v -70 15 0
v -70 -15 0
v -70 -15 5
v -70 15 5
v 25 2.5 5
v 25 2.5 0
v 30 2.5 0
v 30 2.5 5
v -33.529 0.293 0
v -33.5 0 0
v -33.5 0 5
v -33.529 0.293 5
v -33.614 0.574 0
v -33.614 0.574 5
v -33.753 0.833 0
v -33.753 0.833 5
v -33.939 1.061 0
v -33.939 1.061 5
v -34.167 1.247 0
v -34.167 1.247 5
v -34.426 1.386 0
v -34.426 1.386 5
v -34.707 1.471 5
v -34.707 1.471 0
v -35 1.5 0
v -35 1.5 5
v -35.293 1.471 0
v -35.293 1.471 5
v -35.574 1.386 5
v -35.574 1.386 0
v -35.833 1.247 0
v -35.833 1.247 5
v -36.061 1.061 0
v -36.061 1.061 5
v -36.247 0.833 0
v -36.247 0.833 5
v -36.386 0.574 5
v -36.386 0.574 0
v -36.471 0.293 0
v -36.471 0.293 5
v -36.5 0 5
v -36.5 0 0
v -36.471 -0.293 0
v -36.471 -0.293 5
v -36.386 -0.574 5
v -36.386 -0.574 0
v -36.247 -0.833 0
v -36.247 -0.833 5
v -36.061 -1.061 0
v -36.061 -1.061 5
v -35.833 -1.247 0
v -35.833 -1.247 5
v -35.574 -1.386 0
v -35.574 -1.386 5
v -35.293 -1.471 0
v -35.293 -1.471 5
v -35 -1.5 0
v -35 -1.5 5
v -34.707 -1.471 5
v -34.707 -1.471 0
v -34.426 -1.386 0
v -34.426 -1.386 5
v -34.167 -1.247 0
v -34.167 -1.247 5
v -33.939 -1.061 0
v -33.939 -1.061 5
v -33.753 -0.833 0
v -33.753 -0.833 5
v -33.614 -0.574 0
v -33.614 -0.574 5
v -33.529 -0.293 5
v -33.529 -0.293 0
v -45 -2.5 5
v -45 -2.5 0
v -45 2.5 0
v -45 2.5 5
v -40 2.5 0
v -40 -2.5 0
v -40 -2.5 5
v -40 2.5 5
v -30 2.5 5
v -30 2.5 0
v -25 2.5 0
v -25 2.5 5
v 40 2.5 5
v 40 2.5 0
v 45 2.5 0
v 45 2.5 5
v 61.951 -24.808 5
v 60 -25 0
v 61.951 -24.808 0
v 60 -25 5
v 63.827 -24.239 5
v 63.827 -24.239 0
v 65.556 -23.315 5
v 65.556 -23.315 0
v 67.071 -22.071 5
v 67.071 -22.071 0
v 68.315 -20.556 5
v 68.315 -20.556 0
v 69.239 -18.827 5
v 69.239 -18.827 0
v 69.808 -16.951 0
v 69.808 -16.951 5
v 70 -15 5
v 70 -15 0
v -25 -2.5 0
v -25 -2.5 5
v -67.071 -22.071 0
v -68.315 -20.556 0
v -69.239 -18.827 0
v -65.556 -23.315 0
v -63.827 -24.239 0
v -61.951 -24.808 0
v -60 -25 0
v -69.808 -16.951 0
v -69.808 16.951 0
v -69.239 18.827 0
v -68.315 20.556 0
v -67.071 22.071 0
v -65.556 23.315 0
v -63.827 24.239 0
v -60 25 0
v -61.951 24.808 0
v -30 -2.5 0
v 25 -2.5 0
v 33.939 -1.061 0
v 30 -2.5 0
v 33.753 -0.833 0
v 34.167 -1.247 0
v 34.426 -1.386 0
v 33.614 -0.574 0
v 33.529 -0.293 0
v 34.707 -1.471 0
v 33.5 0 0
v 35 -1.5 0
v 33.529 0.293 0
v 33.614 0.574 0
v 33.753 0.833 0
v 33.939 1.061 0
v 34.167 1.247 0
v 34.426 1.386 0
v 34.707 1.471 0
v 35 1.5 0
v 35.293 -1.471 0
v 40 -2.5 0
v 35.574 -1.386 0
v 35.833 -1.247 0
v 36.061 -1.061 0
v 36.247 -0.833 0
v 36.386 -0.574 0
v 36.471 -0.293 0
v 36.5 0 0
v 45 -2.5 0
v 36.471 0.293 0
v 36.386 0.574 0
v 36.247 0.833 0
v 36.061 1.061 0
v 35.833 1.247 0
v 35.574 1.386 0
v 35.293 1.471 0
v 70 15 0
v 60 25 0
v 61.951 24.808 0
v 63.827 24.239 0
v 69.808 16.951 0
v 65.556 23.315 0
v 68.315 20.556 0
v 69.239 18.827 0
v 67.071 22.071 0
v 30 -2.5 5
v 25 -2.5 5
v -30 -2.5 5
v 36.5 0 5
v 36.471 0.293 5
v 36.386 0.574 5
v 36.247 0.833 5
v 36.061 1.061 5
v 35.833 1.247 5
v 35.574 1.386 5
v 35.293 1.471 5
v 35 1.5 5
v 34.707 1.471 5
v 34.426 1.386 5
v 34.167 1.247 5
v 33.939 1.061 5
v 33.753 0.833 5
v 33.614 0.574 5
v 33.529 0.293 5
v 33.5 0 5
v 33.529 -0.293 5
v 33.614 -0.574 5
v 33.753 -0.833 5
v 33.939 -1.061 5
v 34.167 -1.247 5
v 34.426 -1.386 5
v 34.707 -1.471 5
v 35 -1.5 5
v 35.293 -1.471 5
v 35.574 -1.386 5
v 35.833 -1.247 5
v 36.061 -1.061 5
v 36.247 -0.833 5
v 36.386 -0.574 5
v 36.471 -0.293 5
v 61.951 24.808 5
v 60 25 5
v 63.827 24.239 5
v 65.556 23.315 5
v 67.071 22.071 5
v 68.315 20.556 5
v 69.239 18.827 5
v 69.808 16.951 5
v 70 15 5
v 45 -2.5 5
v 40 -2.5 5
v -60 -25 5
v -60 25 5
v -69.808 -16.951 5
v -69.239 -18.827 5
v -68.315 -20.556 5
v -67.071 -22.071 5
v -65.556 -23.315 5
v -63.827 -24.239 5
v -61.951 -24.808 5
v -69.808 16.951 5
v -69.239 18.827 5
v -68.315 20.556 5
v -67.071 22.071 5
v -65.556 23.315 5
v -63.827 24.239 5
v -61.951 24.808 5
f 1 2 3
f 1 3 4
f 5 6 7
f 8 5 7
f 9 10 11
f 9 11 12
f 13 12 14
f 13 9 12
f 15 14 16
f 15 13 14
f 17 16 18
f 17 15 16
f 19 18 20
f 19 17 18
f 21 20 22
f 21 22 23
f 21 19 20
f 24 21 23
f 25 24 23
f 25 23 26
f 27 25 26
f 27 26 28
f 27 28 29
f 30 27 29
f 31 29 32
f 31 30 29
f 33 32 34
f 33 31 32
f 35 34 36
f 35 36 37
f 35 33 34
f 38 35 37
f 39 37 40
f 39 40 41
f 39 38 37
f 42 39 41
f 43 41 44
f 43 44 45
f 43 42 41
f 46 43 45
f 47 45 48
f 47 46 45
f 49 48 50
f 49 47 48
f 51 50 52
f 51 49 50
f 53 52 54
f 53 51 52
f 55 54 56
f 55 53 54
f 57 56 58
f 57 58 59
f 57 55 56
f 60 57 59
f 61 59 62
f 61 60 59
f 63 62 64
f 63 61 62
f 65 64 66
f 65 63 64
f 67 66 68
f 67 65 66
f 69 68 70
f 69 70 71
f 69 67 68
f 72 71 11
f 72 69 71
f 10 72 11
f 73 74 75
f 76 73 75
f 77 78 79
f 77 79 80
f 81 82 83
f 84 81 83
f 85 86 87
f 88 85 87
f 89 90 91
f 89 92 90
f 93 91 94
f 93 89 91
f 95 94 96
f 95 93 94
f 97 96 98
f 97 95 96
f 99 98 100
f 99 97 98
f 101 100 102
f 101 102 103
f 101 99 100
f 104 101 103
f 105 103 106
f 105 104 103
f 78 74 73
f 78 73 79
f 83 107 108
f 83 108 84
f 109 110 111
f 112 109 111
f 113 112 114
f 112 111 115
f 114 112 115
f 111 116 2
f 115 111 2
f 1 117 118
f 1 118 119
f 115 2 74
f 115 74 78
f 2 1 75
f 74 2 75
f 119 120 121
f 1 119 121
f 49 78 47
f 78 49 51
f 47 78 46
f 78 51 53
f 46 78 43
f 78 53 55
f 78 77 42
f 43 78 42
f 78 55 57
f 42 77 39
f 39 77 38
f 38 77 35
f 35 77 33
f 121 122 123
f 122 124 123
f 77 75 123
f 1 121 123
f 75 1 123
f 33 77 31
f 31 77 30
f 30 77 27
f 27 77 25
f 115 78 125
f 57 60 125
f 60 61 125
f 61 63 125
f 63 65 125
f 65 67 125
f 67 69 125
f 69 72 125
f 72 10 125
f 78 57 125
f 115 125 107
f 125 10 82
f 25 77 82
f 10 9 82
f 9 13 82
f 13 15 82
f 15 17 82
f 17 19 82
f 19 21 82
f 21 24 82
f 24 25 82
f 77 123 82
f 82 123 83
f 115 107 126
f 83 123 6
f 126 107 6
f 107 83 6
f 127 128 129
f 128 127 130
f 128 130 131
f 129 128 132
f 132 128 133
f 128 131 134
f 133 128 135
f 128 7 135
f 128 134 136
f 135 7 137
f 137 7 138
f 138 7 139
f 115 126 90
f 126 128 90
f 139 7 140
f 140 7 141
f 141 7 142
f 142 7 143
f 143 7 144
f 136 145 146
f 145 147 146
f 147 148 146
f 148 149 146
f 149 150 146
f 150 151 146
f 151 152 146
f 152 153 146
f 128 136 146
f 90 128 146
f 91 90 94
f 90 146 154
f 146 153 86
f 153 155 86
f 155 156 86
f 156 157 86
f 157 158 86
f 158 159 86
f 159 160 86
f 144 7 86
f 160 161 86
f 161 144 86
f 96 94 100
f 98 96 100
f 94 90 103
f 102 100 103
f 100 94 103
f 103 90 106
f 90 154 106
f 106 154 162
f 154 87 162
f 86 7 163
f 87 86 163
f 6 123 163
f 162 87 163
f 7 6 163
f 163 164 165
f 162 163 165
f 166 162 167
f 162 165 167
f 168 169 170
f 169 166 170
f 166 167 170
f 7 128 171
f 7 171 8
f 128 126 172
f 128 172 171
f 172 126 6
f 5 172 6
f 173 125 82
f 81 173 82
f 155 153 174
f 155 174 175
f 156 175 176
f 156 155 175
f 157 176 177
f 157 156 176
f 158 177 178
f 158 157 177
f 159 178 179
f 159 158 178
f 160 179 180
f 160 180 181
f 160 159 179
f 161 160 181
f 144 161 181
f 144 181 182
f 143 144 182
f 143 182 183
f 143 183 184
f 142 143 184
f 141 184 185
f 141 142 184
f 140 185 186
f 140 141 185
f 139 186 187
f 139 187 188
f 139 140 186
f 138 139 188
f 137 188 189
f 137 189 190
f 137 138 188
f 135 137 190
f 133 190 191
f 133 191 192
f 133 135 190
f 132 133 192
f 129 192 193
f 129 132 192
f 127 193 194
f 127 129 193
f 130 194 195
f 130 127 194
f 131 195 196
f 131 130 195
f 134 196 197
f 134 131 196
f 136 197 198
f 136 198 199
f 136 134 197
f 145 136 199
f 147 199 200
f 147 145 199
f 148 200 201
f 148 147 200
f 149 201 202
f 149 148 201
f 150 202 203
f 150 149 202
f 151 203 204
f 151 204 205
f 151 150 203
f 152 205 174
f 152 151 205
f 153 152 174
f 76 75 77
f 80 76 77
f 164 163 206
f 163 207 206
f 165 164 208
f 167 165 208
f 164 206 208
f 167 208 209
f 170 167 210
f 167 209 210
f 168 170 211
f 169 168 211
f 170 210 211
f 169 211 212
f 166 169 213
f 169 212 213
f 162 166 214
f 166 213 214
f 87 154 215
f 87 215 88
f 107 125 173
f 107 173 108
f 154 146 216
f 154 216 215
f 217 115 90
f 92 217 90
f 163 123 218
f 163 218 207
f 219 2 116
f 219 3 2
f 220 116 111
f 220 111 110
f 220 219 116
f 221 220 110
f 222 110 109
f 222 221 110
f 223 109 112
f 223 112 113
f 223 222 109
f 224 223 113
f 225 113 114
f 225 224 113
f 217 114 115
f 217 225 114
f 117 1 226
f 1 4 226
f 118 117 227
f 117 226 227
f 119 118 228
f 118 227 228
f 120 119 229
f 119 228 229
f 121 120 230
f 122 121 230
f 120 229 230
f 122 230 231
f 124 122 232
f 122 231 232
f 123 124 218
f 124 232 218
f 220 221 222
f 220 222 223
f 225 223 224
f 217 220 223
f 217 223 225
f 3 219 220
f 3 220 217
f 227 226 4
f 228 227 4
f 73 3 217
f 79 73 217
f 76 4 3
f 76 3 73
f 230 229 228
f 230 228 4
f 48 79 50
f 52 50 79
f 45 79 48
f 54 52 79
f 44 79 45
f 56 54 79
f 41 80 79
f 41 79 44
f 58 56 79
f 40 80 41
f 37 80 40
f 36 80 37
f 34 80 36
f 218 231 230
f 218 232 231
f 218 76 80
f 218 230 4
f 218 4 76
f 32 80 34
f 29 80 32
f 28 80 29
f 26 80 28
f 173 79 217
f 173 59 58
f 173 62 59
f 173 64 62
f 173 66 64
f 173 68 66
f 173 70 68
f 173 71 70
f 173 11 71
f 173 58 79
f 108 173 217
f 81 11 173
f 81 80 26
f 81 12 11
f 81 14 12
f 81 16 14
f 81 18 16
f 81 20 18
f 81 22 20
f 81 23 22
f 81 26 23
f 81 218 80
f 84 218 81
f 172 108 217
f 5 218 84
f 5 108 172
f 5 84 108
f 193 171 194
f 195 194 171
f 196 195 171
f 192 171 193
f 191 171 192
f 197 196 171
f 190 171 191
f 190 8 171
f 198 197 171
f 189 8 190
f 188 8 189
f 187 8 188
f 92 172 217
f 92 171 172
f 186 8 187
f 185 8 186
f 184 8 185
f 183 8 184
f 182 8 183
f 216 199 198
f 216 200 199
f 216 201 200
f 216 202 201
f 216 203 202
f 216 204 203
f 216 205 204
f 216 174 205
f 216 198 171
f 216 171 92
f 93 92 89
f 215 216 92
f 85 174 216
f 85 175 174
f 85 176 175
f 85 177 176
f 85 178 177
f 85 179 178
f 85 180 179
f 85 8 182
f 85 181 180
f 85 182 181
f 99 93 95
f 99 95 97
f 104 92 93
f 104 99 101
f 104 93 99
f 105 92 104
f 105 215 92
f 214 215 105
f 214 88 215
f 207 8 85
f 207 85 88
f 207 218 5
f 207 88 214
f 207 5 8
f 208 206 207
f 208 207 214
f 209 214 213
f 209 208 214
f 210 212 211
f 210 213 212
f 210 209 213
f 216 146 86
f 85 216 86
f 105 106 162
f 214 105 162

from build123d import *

# Parameters (mm, degrees)
SKETCH1_W           = 140
SKETCH1_H           = 50
SKETCH1_R           = 1.5
SKETCH1_W_2         = 5
SKETCH1_H_2         = 5
BOSS_EXTRUDE1_DEPTH = 5
FILLET1_R           = 10


with BuildPart() as part:
    # Sketch1 → Boss-Extrude1 (new body)
    with BuildSketch(Plane.XY):
        Rectangle(SKETCH1_W, SKETCH1_H)
        with Locations((35, 0)):
            Circle(SKETCH1_R, mode=Mode.SUBTRACT)
        with Locations((-35, 0)):
            Circle(SKETCH1_R, mode=Mode.SUBTRACT)
        with Locations((27.5, 0)):
            Rectangle(SKETCH1_W_2, SKETCH1_H_2, mode=Mode.SUBTRACT)
        with Locations((42.5, 0)):
            Rectangle(SKETCH1_W_2, SKETCH1_H_2, mode=Mode.SUBTRACT)
        with Locations((-42.5, 0)):
            Rectangle(SKETCH1_W_2, SKETCH1_H_2, mode=Mode.SUBTRACT)
        with Locations((-27.5, 0)):
            Rectangle(SKETCH1_W_2, SKETCH1_H_2, mode=Mode.SUBTRACT)
    extrude(amount=BOSS_EXTRUDE1_DEPTH)

    # Fillet1
    fillet1_edges = [part.edges().sort_by_distance(p)[0] for p in [
        (70, -25, 2.5),
        (-70, -25, 2.5),
        (-70, 25, 2.5),
        (70, 25, 2.5),
    ]]
    fillet(fillet1_edges, radius=FILLET1_R)


solid = part.part
